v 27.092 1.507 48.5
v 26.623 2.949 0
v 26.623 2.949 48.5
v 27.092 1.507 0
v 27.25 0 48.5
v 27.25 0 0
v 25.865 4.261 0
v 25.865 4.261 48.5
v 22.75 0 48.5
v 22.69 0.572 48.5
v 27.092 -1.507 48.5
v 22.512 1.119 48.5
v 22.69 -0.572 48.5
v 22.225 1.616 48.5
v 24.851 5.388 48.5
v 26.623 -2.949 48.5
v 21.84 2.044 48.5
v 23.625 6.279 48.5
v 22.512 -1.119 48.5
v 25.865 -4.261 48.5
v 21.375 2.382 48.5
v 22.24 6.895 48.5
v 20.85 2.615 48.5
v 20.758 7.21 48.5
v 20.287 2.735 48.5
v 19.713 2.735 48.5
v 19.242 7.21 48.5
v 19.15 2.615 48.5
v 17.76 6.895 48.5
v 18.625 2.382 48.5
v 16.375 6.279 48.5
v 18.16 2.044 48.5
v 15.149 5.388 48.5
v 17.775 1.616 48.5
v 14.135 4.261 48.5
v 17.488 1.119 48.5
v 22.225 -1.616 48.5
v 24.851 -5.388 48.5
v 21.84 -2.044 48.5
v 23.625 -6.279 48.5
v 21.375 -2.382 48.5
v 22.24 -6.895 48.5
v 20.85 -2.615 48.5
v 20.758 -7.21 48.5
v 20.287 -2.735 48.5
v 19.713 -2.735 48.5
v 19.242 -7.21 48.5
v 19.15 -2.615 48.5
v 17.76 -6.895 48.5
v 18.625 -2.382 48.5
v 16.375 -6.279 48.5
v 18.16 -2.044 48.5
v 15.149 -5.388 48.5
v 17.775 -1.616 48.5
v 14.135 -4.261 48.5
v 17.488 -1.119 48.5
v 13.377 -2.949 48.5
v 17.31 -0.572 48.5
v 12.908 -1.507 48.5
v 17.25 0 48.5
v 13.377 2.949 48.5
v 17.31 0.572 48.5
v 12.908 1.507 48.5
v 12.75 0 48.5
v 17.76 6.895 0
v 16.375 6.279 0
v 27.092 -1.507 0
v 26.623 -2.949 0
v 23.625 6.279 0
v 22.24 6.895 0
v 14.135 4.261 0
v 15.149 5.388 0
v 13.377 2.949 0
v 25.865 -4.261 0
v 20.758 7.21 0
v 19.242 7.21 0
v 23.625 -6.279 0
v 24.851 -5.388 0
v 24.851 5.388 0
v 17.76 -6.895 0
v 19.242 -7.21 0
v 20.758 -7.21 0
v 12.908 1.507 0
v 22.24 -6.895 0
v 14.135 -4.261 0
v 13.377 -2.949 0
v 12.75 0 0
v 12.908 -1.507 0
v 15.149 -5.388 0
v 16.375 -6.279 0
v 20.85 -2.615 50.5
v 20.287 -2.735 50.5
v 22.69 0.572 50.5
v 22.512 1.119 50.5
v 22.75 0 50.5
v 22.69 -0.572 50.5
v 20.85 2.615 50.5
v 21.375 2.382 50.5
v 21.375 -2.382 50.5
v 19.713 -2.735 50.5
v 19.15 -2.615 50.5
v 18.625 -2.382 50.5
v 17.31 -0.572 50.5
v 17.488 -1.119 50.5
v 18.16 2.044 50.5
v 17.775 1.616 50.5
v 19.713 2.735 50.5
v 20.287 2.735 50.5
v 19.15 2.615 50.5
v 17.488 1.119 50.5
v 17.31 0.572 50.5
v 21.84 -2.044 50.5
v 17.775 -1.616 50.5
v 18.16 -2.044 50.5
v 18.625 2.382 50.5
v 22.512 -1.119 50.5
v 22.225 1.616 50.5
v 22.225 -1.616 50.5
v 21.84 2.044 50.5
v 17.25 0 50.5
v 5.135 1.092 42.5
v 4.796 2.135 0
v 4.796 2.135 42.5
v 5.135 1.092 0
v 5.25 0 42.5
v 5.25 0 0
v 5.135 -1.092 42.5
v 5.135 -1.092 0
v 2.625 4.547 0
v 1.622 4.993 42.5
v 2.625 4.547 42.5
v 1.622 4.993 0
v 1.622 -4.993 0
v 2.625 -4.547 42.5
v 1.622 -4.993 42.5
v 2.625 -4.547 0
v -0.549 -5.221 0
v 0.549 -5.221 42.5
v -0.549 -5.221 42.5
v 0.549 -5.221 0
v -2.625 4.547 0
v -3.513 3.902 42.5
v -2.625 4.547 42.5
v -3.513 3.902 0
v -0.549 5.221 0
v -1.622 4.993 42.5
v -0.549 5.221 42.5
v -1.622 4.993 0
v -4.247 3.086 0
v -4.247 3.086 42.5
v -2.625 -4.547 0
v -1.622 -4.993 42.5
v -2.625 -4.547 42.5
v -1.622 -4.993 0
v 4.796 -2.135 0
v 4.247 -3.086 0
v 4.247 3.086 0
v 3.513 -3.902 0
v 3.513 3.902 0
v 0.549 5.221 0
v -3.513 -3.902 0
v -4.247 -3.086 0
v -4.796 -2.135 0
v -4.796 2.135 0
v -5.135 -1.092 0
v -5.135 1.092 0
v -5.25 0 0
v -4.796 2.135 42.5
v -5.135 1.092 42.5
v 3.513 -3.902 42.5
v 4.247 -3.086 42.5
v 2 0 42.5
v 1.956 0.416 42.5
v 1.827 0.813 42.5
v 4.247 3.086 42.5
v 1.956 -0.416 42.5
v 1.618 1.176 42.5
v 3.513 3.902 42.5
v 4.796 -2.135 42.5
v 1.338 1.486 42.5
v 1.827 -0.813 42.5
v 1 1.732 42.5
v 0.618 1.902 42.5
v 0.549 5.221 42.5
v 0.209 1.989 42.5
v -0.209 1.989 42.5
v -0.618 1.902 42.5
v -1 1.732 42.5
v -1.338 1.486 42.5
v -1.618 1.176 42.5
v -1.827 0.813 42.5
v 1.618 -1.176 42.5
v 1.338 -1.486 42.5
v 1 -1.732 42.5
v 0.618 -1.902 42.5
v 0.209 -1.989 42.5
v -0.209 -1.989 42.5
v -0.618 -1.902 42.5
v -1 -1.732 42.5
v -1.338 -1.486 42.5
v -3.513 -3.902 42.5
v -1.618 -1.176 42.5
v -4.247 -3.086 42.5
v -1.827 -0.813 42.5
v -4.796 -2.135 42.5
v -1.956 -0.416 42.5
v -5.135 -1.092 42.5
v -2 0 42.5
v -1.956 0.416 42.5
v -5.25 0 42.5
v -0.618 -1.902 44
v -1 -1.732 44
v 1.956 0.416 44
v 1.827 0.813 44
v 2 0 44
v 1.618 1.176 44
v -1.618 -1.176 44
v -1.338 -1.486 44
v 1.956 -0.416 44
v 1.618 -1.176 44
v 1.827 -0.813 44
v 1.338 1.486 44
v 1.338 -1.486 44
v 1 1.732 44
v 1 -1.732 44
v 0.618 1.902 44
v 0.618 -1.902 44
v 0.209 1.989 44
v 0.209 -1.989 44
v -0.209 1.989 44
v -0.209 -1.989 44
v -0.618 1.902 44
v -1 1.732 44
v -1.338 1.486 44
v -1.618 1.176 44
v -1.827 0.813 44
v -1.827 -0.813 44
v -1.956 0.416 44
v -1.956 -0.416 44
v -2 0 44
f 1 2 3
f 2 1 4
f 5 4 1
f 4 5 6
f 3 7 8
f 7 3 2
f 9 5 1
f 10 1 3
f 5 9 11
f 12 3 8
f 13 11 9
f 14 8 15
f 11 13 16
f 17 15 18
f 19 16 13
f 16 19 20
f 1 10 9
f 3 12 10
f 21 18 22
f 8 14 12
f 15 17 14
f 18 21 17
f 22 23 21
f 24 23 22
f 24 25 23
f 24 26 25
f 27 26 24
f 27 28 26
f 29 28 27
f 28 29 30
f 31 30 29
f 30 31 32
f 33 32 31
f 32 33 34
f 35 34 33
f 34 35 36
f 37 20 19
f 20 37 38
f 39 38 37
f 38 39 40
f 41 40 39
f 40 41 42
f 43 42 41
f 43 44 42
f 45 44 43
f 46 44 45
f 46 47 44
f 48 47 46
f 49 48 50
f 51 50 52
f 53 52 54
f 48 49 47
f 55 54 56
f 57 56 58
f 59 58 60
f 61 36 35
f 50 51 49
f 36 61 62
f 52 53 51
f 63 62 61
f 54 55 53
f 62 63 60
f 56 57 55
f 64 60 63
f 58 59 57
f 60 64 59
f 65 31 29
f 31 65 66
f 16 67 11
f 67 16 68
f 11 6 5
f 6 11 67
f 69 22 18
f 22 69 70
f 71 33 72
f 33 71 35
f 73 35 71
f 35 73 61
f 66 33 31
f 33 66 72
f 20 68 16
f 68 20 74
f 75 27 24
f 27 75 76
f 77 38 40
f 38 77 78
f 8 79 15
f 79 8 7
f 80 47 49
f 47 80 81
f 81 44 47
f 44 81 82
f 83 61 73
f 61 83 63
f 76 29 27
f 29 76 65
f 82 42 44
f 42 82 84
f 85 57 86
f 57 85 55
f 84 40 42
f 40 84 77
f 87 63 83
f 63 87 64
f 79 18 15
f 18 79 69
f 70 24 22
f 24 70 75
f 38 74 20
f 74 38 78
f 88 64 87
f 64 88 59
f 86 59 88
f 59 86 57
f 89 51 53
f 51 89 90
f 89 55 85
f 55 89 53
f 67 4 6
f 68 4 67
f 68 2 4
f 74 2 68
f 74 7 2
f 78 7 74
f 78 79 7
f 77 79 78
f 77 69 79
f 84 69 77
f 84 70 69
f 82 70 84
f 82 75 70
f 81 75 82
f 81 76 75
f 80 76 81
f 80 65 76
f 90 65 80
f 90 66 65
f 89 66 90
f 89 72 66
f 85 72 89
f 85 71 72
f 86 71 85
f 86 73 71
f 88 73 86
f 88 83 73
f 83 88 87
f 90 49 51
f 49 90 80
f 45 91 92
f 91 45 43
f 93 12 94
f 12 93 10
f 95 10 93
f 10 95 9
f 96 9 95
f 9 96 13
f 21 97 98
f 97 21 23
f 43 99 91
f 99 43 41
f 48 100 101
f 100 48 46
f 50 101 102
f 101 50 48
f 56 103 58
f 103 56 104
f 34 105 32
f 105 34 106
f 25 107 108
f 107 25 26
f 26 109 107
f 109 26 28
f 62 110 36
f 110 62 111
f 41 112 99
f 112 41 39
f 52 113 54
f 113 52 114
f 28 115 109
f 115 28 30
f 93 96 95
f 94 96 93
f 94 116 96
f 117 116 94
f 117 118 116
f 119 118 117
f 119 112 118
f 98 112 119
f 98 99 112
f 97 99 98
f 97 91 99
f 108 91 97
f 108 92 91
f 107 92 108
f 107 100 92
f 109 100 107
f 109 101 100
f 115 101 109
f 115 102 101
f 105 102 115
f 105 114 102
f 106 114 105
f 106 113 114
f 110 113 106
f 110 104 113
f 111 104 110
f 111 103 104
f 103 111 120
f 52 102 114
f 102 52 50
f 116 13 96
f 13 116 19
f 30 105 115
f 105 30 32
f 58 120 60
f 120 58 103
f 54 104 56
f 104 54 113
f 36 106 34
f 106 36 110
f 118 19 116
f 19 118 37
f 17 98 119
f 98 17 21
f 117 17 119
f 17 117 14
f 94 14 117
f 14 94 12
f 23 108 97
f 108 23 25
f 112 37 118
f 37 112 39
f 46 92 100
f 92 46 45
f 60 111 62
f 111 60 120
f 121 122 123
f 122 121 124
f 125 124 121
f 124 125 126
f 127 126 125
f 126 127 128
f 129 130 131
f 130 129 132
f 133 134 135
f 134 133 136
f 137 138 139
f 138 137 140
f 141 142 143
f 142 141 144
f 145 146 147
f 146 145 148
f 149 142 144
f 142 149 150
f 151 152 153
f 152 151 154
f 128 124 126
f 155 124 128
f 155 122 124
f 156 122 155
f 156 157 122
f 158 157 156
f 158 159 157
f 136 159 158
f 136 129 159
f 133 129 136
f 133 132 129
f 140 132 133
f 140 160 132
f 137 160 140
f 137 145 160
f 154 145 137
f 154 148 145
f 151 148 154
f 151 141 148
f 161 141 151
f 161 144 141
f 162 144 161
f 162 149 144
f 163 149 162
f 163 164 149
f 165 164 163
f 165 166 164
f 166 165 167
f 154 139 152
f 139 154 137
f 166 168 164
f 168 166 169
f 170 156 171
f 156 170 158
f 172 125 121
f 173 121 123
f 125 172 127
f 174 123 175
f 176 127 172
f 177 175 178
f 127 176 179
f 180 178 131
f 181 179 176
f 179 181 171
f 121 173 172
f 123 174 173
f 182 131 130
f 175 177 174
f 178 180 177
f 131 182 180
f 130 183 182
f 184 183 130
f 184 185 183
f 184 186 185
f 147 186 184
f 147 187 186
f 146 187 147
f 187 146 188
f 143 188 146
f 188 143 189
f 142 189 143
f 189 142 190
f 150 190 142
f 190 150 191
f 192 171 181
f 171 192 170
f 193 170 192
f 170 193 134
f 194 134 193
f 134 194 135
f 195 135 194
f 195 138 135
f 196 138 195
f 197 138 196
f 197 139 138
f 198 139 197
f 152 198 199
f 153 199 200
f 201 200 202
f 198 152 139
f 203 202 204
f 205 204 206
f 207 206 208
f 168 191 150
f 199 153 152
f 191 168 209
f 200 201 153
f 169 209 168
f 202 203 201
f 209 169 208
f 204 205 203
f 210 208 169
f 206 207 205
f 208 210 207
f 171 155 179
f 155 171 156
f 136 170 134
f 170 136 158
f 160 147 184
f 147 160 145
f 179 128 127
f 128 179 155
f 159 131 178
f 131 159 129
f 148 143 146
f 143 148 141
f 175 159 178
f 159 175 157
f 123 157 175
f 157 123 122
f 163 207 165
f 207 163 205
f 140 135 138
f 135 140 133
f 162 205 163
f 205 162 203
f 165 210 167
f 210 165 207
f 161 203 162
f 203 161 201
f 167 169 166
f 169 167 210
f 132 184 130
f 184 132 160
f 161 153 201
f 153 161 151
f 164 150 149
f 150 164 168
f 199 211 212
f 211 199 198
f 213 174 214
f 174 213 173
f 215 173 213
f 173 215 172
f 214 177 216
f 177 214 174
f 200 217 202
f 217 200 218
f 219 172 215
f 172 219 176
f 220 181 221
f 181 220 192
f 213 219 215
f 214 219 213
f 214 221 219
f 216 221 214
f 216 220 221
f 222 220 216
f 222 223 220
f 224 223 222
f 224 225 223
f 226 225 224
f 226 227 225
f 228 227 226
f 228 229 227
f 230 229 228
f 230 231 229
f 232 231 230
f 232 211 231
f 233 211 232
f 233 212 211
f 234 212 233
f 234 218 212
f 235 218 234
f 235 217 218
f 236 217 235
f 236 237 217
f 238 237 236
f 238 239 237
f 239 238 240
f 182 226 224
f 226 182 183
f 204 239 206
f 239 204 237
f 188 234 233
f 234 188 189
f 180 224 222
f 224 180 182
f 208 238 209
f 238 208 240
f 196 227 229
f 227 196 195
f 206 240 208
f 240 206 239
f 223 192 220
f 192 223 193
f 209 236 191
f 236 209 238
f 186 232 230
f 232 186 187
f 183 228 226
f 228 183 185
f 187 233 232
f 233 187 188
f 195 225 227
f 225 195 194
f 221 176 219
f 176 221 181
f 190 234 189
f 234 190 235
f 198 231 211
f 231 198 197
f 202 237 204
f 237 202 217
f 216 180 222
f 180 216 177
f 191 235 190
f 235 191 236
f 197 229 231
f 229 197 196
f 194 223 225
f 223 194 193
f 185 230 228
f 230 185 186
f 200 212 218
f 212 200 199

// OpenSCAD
module batteryAA()
{
  cylinder(h=48.5, r=14.5/2, $fs=0.1);
  translate([0,0, 48.5])
    cylinder(h=2, r=5.5/2, $fs=0.1);
}

module batteryAAA()
{
  cylinder(h=42.5, r=10.5/2, $fs=0.1);
  translate([0,0, 42.5])
    cylinder(h=1.5, r=4/2, $fs=0.1);
}

// just an exhibition - not used directly
translate([20,0,0])
  batteryAA();
translate([0,0,0])
  batteryAAA();
